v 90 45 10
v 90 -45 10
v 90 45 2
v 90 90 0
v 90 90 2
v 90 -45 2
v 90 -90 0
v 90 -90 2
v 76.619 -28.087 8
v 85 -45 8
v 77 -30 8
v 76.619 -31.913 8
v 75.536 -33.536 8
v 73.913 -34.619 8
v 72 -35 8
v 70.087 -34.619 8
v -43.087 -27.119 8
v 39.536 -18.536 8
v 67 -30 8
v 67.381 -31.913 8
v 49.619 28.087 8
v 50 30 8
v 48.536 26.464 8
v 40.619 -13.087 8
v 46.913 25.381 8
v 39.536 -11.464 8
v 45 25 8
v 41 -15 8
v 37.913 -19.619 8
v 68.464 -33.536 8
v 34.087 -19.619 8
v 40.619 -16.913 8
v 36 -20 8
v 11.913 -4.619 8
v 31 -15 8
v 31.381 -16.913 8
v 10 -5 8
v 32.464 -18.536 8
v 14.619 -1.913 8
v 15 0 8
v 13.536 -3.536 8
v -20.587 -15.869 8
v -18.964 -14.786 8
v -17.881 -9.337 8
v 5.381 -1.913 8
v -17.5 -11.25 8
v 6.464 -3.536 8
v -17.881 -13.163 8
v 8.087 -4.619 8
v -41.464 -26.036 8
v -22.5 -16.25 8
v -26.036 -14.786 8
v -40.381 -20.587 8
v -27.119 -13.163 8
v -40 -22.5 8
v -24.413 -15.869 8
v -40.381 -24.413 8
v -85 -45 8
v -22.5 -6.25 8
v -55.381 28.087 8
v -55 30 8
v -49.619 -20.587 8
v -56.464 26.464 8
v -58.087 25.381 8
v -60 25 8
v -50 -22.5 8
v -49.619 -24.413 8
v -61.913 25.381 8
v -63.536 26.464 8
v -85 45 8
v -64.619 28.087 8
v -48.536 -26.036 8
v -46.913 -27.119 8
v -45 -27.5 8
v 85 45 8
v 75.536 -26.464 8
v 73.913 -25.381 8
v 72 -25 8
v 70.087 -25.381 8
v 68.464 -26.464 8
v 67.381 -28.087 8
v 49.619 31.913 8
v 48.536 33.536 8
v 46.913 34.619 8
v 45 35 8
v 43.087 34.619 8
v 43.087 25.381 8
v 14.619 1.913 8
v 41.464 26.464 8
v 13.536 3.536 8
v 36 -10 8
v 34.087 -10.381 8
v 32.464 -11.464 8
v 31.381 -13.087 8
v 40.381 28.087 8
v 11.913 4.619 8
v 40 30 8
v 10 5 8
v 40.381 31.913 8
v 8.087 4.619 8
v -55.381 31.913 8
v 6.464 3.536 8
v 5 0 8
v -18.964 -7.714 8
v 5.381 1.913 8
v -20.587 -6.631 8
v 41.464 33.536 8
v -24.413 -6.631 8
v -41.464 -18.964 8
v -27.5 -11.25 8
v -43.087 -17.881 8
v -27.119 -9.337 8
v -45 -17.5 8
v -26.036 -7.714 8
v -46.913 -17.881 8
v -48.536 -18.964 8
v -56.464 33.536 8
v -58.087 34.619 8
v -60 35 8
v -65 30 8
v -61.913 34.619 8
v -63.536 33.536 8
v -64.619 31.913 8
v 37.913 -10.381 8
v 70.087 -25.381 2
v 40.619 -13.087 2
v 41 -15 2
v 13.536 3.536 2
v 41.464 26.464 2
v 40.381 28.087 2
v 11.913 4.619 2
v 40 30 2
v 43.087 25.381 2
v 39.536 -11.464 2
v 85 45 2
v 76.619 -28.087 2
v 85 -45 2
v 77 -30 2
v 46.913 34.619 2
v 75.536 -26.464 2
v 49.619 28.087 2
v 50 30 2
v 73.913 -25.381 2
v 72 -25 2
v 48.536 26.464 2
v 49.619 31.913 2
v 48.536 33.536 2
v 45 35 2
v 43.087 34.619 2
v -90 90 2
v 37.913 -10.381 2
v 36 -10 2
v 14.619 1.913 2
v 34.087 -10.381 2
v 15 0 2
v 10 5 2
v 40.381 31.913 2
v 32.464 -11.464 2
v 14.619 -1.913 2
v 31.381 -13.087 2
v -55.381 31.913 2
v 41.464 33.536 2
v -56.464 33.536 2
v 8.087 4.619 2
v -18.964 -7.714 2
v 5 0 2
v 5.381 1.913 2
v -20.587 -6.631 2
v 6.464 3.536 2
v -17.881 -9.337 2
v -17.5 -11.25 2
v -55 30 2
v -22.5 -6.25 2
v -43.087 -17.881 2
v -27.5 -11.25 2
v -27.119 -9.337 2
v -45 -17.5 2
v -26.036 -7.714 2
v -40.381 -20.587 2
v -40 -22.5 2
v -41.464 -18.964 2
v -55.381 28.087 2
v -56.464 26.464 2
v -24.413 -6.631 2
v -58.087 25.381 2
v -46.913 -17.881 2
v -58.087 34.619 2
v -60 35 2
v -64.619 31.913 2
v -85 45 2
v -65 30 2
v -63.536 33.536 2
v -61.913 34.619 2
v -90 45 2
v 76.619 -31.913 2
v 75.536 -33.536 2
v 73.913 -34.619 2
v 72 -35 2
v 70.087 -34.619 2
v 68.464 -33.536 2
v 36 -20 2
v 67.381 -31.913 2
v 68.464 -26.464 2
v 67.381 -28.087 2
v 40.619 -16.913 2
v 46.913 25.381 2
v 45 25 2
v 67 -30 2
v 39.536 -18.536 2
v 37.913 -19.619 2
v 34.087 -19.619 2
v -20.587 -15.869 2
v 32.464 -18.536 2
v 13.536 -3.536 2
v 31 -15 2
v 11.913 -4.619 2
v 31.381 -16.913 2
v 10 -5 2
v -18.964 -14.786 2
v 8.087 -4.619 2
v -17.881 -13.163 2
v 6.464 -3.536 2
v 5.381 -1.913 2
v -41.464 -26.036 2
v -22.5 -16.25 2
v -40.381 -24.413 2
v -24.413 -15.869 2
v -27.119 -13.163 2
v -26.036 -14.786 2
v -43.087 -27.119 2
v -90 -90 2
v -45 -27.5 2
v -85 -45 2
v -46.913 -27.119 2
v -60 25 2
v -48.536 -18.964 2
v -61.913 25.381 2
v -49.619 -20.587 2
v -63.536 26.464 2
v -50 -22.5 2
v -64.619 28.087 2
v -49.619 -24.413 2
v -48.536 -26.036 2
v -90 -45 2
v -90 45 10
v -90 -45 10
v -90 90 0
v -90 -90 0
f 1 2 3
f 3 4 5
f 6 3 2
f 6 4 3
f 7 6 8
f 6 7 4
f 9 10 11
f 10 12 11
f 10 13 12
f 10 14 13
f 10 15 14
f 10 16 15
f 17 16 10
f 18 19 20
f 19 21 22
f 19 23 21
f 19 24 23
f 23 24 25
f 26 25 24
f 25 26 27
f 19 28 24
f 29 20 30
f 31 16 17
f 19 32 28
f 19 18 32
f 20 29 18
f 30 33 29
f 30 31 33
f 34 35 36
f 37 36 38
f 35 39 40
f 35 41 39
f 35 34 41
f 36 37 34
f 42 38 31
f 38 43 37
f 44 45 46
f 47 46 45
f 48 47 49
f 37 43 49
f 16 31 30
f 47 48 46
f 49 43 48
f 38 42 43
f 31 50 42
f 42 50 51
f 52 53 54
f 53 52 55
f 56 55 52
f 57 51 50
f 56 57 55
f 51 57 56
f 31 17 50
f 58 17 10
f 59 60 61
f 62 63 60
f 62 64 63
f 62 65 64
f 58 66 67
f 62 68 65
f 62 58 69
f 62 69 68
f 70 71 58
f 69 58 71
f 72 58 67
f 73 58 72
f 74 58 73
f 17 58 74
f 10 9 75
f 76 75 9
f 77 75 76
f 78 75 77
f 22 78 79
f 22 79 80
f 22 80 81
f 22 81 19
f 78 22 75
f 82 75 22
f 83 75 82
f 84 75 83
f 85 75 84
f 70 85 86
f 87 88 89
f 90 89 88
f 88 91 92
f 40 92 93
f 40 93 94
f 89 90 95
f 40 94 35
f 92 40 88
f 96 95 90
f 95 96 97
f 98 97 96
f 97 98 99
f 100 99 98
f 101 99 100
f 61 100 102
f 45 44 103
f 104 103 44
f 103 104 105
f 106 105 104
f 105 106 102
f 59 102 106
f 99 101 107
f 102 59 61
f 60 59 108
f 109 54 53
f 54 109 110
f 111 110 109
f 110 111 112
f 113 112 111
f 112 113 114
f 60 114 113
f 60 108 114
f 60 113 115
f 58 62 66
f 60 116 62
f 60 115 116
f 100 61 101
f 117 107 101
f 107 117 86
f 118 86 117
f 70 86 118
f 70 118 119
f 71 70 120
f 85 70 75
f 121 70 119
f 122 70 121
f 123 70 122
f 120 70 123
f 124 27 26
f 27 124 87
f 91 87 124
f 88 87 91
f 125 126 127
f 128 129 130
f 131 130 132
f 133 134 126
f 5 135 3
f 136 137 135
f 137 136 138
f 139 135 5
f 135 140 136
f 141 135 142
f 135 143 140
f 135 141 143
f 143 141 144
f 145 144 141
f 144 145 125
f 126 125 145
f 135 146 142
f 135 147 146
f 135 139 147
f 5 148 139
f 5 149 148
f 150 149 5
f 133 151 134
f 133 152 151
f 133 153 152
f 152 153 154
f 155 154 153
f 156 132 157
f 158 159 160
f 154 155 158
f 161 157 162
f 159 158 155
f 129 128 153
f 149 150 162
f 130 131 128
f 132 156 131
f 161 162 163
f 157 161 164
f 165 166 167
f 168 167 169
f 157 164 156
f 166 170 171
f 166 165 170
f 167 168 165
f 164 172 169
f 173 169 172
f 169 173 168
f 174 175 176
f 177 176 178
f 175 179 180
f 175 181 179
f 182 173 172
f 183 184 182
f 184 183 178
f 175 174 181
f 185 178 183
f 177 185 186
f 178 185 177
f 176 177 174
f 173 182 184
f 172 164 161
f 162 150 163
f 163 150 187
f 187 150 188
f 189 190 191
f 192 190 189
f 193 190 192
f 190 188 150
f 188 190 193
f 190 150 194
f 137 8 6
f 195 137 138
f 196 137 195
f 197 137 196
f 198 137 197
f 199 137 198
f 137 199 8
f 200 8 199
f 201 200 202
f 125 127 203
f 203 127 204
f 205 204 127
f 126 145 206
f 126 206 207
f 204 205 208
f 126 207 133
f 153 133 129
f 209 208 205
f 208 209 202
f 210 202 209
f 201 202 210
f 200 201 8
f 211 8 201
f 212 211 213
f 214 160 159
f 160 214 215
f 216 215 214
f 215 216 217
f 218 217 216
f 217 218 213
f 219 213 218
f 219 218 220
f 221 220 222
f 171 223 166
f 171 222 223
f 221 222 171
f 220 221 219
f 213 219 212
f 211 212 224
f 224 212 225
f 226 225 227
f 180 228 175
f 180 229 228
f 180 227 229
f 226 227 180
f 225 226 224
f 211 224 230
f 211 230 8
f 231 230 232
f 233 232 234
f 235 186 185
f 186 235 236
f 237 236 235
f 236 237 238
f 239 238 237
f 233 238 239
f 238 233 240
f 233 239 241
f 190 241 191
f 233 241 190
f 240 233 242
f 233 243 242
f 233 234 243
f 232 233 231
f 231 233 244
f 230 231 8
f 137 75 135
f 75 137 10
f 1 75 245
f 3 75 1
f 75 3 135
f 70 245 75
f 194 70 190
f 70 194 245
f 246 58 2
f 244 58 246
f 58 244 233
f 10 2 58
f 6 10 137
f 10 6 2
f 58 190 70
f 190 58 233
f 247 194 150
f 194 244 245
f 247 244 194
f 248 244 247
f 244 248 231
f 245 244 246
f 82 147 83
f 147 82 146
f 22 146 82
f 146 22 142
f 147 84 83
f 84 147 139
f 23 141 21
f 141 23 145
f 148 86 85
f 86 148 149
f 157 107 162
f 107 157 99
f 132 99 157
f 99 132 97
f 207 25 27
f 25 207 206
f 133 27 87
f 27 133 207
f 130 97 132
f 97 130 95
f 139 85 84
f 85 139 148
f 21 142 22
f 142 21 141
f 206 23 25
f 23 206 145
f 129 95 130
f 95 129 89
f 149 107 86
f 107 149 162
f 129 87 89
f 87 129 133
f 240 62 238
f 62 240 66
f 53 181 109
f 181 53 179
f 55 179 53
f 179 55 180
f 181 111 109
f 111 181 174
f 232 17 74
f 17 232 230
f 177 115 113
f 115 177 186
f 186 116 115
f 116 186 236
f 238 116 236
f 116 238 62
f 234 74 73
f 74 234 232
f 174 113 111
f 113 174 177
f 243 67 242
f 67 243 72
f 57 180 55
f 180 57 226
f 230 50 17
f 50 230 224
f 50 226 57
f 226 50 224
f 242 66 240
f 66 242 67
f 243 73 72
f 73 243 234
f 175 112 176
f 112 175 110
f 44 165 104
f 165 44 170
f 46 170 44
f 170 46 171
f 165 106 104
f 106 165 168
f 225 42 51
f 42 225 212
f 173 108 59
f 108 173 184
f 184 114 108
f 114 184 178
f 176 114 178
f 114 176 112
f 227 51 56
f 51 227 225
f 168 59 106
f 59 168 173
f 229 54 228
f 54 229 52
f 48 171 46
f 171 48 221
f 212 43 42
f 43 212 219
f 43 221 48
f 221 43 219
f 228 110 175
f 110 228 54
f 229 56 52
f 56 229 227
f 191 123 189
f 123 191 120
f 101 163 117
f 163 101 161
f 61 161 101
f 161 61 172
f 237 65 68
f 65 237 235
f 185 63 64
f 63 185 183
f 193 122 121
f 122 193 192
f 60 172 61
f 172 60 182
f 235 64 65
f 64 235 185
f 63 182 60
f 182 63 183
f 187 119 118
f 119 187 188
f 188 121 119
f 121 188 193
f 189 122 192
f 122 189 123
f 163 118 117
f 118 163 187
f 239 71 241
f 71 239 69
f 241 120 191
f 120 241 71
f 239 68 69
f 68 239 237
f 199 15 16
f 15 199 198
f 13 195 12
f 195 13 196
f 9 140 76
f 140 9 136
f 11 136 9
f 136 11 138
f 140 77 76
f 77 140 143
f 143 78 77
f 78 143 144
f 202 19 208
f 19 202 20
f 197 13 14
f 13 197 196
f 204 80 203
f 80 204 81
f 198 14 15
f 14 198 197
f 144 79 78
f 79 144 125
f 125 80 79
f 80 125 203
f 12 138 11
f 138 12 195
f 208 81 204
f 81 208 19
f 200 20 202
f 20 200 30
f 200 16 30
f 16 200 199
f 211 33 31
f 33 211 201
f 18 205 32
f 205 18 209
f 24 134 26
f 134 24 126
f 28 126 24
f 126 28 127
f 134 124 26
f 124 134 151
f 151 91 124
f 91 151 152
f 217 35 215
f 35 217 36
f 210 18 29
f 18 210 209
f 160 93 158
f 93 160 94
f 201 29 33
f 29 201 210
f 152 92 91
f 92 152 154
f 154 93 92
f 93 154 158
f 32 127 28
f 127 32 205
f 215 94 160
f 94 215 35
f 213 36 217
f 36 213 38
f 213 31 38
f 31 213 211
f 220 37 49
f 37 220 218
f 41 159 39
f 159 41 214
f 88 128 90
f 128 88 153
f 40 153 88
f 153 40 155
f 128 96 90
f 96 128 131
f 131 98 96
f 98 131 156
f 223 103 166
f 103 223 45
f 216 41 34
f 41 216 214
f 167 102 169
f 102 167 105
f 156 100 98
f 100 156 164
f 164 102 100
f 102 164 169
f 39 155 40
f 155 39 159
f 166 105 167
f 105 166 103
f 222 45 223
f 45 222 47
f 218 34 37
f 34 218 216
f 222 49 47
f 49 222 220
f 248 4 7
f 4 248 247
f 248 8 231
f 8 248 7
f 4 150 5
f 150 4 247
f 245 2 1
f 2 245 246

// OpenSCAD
length = 180;

width = 180;

base_height = 2;

gap_height = 6;

cover_width = 180;
cover_length = 90;
cover_side_width = 5;

cylinder_bottom_radius = 5;
cylinder_top_radius = 5;

// Relative to center
pillar_coords = [
    [cover_width/4,cover_length/3],
    [-cover_width/4,-cover_length/4],
    [-cover_width/8,-cover_length/8],
    [-cover_width/3,cover_length/3],
    [cover_width/2.5,-cover_length/3],
    [cover_width/5,-cover_length/6],
    [10,0]
];

base();
cover();
cover_sizes();
pillars();

// Pillars
module pillars(){
    for( i = [0 : len(pillar_coords) - 1] ){
        translate([
            pillar_coords[i][0],
            pillar_coords[i][1],
            0 
        ]){
            pillar();
        }
    }
}
// Pole
module pillar(){
    translate([0,0,base_height])
    cylinder(h = gap_height, r1 = cylinder_bottom_radius, r2 = cylinder_top_radius, center = false);
}

// Base
module base() {
    linear_extrude(base_height) {
        polygon(
            points=[
                [-width/2, -length/2]
                ,[width/2, -length/2]
                ,[width/2, length/2]
                ,[-width/2, length/2]
                ,[-width/2, -length/2]
            ]
            ,paths=[[0, 1, 2, 3, 4]]
        );
    }
}

// Cover
module cover() {
    translate([0,0,gap_height+base_height]) {
        linear_extrude(base_height) {
            polygon(
                points=[
                    [-cover_width/2, -cover_length/2]
                    ,[cover_width/2, -cover_length/2]
                    ,[cover_width/2, cover_length/2]
                    ,[-cover_width/2, cover_length/2]
                    ,[-cover_width/2, -cover_length/2]
                ]
                ,paths=[[0, 1, 2, 3, 4]]
            );
        }
    }
}

    //Cover Sides
module cover_sizes() {
    translate([cover_width/2-cover_side_width/2,0,gap_height/2+base_height])
    cube(size = [cover_side_width,cover_length,gap_height], center = true);

    translate([-(cover_width/2-cover_side_width/2),0,gap_height/2+base_height])
    cube(size = [cover_side_width,cover_length,gap_height], center = true);
}
